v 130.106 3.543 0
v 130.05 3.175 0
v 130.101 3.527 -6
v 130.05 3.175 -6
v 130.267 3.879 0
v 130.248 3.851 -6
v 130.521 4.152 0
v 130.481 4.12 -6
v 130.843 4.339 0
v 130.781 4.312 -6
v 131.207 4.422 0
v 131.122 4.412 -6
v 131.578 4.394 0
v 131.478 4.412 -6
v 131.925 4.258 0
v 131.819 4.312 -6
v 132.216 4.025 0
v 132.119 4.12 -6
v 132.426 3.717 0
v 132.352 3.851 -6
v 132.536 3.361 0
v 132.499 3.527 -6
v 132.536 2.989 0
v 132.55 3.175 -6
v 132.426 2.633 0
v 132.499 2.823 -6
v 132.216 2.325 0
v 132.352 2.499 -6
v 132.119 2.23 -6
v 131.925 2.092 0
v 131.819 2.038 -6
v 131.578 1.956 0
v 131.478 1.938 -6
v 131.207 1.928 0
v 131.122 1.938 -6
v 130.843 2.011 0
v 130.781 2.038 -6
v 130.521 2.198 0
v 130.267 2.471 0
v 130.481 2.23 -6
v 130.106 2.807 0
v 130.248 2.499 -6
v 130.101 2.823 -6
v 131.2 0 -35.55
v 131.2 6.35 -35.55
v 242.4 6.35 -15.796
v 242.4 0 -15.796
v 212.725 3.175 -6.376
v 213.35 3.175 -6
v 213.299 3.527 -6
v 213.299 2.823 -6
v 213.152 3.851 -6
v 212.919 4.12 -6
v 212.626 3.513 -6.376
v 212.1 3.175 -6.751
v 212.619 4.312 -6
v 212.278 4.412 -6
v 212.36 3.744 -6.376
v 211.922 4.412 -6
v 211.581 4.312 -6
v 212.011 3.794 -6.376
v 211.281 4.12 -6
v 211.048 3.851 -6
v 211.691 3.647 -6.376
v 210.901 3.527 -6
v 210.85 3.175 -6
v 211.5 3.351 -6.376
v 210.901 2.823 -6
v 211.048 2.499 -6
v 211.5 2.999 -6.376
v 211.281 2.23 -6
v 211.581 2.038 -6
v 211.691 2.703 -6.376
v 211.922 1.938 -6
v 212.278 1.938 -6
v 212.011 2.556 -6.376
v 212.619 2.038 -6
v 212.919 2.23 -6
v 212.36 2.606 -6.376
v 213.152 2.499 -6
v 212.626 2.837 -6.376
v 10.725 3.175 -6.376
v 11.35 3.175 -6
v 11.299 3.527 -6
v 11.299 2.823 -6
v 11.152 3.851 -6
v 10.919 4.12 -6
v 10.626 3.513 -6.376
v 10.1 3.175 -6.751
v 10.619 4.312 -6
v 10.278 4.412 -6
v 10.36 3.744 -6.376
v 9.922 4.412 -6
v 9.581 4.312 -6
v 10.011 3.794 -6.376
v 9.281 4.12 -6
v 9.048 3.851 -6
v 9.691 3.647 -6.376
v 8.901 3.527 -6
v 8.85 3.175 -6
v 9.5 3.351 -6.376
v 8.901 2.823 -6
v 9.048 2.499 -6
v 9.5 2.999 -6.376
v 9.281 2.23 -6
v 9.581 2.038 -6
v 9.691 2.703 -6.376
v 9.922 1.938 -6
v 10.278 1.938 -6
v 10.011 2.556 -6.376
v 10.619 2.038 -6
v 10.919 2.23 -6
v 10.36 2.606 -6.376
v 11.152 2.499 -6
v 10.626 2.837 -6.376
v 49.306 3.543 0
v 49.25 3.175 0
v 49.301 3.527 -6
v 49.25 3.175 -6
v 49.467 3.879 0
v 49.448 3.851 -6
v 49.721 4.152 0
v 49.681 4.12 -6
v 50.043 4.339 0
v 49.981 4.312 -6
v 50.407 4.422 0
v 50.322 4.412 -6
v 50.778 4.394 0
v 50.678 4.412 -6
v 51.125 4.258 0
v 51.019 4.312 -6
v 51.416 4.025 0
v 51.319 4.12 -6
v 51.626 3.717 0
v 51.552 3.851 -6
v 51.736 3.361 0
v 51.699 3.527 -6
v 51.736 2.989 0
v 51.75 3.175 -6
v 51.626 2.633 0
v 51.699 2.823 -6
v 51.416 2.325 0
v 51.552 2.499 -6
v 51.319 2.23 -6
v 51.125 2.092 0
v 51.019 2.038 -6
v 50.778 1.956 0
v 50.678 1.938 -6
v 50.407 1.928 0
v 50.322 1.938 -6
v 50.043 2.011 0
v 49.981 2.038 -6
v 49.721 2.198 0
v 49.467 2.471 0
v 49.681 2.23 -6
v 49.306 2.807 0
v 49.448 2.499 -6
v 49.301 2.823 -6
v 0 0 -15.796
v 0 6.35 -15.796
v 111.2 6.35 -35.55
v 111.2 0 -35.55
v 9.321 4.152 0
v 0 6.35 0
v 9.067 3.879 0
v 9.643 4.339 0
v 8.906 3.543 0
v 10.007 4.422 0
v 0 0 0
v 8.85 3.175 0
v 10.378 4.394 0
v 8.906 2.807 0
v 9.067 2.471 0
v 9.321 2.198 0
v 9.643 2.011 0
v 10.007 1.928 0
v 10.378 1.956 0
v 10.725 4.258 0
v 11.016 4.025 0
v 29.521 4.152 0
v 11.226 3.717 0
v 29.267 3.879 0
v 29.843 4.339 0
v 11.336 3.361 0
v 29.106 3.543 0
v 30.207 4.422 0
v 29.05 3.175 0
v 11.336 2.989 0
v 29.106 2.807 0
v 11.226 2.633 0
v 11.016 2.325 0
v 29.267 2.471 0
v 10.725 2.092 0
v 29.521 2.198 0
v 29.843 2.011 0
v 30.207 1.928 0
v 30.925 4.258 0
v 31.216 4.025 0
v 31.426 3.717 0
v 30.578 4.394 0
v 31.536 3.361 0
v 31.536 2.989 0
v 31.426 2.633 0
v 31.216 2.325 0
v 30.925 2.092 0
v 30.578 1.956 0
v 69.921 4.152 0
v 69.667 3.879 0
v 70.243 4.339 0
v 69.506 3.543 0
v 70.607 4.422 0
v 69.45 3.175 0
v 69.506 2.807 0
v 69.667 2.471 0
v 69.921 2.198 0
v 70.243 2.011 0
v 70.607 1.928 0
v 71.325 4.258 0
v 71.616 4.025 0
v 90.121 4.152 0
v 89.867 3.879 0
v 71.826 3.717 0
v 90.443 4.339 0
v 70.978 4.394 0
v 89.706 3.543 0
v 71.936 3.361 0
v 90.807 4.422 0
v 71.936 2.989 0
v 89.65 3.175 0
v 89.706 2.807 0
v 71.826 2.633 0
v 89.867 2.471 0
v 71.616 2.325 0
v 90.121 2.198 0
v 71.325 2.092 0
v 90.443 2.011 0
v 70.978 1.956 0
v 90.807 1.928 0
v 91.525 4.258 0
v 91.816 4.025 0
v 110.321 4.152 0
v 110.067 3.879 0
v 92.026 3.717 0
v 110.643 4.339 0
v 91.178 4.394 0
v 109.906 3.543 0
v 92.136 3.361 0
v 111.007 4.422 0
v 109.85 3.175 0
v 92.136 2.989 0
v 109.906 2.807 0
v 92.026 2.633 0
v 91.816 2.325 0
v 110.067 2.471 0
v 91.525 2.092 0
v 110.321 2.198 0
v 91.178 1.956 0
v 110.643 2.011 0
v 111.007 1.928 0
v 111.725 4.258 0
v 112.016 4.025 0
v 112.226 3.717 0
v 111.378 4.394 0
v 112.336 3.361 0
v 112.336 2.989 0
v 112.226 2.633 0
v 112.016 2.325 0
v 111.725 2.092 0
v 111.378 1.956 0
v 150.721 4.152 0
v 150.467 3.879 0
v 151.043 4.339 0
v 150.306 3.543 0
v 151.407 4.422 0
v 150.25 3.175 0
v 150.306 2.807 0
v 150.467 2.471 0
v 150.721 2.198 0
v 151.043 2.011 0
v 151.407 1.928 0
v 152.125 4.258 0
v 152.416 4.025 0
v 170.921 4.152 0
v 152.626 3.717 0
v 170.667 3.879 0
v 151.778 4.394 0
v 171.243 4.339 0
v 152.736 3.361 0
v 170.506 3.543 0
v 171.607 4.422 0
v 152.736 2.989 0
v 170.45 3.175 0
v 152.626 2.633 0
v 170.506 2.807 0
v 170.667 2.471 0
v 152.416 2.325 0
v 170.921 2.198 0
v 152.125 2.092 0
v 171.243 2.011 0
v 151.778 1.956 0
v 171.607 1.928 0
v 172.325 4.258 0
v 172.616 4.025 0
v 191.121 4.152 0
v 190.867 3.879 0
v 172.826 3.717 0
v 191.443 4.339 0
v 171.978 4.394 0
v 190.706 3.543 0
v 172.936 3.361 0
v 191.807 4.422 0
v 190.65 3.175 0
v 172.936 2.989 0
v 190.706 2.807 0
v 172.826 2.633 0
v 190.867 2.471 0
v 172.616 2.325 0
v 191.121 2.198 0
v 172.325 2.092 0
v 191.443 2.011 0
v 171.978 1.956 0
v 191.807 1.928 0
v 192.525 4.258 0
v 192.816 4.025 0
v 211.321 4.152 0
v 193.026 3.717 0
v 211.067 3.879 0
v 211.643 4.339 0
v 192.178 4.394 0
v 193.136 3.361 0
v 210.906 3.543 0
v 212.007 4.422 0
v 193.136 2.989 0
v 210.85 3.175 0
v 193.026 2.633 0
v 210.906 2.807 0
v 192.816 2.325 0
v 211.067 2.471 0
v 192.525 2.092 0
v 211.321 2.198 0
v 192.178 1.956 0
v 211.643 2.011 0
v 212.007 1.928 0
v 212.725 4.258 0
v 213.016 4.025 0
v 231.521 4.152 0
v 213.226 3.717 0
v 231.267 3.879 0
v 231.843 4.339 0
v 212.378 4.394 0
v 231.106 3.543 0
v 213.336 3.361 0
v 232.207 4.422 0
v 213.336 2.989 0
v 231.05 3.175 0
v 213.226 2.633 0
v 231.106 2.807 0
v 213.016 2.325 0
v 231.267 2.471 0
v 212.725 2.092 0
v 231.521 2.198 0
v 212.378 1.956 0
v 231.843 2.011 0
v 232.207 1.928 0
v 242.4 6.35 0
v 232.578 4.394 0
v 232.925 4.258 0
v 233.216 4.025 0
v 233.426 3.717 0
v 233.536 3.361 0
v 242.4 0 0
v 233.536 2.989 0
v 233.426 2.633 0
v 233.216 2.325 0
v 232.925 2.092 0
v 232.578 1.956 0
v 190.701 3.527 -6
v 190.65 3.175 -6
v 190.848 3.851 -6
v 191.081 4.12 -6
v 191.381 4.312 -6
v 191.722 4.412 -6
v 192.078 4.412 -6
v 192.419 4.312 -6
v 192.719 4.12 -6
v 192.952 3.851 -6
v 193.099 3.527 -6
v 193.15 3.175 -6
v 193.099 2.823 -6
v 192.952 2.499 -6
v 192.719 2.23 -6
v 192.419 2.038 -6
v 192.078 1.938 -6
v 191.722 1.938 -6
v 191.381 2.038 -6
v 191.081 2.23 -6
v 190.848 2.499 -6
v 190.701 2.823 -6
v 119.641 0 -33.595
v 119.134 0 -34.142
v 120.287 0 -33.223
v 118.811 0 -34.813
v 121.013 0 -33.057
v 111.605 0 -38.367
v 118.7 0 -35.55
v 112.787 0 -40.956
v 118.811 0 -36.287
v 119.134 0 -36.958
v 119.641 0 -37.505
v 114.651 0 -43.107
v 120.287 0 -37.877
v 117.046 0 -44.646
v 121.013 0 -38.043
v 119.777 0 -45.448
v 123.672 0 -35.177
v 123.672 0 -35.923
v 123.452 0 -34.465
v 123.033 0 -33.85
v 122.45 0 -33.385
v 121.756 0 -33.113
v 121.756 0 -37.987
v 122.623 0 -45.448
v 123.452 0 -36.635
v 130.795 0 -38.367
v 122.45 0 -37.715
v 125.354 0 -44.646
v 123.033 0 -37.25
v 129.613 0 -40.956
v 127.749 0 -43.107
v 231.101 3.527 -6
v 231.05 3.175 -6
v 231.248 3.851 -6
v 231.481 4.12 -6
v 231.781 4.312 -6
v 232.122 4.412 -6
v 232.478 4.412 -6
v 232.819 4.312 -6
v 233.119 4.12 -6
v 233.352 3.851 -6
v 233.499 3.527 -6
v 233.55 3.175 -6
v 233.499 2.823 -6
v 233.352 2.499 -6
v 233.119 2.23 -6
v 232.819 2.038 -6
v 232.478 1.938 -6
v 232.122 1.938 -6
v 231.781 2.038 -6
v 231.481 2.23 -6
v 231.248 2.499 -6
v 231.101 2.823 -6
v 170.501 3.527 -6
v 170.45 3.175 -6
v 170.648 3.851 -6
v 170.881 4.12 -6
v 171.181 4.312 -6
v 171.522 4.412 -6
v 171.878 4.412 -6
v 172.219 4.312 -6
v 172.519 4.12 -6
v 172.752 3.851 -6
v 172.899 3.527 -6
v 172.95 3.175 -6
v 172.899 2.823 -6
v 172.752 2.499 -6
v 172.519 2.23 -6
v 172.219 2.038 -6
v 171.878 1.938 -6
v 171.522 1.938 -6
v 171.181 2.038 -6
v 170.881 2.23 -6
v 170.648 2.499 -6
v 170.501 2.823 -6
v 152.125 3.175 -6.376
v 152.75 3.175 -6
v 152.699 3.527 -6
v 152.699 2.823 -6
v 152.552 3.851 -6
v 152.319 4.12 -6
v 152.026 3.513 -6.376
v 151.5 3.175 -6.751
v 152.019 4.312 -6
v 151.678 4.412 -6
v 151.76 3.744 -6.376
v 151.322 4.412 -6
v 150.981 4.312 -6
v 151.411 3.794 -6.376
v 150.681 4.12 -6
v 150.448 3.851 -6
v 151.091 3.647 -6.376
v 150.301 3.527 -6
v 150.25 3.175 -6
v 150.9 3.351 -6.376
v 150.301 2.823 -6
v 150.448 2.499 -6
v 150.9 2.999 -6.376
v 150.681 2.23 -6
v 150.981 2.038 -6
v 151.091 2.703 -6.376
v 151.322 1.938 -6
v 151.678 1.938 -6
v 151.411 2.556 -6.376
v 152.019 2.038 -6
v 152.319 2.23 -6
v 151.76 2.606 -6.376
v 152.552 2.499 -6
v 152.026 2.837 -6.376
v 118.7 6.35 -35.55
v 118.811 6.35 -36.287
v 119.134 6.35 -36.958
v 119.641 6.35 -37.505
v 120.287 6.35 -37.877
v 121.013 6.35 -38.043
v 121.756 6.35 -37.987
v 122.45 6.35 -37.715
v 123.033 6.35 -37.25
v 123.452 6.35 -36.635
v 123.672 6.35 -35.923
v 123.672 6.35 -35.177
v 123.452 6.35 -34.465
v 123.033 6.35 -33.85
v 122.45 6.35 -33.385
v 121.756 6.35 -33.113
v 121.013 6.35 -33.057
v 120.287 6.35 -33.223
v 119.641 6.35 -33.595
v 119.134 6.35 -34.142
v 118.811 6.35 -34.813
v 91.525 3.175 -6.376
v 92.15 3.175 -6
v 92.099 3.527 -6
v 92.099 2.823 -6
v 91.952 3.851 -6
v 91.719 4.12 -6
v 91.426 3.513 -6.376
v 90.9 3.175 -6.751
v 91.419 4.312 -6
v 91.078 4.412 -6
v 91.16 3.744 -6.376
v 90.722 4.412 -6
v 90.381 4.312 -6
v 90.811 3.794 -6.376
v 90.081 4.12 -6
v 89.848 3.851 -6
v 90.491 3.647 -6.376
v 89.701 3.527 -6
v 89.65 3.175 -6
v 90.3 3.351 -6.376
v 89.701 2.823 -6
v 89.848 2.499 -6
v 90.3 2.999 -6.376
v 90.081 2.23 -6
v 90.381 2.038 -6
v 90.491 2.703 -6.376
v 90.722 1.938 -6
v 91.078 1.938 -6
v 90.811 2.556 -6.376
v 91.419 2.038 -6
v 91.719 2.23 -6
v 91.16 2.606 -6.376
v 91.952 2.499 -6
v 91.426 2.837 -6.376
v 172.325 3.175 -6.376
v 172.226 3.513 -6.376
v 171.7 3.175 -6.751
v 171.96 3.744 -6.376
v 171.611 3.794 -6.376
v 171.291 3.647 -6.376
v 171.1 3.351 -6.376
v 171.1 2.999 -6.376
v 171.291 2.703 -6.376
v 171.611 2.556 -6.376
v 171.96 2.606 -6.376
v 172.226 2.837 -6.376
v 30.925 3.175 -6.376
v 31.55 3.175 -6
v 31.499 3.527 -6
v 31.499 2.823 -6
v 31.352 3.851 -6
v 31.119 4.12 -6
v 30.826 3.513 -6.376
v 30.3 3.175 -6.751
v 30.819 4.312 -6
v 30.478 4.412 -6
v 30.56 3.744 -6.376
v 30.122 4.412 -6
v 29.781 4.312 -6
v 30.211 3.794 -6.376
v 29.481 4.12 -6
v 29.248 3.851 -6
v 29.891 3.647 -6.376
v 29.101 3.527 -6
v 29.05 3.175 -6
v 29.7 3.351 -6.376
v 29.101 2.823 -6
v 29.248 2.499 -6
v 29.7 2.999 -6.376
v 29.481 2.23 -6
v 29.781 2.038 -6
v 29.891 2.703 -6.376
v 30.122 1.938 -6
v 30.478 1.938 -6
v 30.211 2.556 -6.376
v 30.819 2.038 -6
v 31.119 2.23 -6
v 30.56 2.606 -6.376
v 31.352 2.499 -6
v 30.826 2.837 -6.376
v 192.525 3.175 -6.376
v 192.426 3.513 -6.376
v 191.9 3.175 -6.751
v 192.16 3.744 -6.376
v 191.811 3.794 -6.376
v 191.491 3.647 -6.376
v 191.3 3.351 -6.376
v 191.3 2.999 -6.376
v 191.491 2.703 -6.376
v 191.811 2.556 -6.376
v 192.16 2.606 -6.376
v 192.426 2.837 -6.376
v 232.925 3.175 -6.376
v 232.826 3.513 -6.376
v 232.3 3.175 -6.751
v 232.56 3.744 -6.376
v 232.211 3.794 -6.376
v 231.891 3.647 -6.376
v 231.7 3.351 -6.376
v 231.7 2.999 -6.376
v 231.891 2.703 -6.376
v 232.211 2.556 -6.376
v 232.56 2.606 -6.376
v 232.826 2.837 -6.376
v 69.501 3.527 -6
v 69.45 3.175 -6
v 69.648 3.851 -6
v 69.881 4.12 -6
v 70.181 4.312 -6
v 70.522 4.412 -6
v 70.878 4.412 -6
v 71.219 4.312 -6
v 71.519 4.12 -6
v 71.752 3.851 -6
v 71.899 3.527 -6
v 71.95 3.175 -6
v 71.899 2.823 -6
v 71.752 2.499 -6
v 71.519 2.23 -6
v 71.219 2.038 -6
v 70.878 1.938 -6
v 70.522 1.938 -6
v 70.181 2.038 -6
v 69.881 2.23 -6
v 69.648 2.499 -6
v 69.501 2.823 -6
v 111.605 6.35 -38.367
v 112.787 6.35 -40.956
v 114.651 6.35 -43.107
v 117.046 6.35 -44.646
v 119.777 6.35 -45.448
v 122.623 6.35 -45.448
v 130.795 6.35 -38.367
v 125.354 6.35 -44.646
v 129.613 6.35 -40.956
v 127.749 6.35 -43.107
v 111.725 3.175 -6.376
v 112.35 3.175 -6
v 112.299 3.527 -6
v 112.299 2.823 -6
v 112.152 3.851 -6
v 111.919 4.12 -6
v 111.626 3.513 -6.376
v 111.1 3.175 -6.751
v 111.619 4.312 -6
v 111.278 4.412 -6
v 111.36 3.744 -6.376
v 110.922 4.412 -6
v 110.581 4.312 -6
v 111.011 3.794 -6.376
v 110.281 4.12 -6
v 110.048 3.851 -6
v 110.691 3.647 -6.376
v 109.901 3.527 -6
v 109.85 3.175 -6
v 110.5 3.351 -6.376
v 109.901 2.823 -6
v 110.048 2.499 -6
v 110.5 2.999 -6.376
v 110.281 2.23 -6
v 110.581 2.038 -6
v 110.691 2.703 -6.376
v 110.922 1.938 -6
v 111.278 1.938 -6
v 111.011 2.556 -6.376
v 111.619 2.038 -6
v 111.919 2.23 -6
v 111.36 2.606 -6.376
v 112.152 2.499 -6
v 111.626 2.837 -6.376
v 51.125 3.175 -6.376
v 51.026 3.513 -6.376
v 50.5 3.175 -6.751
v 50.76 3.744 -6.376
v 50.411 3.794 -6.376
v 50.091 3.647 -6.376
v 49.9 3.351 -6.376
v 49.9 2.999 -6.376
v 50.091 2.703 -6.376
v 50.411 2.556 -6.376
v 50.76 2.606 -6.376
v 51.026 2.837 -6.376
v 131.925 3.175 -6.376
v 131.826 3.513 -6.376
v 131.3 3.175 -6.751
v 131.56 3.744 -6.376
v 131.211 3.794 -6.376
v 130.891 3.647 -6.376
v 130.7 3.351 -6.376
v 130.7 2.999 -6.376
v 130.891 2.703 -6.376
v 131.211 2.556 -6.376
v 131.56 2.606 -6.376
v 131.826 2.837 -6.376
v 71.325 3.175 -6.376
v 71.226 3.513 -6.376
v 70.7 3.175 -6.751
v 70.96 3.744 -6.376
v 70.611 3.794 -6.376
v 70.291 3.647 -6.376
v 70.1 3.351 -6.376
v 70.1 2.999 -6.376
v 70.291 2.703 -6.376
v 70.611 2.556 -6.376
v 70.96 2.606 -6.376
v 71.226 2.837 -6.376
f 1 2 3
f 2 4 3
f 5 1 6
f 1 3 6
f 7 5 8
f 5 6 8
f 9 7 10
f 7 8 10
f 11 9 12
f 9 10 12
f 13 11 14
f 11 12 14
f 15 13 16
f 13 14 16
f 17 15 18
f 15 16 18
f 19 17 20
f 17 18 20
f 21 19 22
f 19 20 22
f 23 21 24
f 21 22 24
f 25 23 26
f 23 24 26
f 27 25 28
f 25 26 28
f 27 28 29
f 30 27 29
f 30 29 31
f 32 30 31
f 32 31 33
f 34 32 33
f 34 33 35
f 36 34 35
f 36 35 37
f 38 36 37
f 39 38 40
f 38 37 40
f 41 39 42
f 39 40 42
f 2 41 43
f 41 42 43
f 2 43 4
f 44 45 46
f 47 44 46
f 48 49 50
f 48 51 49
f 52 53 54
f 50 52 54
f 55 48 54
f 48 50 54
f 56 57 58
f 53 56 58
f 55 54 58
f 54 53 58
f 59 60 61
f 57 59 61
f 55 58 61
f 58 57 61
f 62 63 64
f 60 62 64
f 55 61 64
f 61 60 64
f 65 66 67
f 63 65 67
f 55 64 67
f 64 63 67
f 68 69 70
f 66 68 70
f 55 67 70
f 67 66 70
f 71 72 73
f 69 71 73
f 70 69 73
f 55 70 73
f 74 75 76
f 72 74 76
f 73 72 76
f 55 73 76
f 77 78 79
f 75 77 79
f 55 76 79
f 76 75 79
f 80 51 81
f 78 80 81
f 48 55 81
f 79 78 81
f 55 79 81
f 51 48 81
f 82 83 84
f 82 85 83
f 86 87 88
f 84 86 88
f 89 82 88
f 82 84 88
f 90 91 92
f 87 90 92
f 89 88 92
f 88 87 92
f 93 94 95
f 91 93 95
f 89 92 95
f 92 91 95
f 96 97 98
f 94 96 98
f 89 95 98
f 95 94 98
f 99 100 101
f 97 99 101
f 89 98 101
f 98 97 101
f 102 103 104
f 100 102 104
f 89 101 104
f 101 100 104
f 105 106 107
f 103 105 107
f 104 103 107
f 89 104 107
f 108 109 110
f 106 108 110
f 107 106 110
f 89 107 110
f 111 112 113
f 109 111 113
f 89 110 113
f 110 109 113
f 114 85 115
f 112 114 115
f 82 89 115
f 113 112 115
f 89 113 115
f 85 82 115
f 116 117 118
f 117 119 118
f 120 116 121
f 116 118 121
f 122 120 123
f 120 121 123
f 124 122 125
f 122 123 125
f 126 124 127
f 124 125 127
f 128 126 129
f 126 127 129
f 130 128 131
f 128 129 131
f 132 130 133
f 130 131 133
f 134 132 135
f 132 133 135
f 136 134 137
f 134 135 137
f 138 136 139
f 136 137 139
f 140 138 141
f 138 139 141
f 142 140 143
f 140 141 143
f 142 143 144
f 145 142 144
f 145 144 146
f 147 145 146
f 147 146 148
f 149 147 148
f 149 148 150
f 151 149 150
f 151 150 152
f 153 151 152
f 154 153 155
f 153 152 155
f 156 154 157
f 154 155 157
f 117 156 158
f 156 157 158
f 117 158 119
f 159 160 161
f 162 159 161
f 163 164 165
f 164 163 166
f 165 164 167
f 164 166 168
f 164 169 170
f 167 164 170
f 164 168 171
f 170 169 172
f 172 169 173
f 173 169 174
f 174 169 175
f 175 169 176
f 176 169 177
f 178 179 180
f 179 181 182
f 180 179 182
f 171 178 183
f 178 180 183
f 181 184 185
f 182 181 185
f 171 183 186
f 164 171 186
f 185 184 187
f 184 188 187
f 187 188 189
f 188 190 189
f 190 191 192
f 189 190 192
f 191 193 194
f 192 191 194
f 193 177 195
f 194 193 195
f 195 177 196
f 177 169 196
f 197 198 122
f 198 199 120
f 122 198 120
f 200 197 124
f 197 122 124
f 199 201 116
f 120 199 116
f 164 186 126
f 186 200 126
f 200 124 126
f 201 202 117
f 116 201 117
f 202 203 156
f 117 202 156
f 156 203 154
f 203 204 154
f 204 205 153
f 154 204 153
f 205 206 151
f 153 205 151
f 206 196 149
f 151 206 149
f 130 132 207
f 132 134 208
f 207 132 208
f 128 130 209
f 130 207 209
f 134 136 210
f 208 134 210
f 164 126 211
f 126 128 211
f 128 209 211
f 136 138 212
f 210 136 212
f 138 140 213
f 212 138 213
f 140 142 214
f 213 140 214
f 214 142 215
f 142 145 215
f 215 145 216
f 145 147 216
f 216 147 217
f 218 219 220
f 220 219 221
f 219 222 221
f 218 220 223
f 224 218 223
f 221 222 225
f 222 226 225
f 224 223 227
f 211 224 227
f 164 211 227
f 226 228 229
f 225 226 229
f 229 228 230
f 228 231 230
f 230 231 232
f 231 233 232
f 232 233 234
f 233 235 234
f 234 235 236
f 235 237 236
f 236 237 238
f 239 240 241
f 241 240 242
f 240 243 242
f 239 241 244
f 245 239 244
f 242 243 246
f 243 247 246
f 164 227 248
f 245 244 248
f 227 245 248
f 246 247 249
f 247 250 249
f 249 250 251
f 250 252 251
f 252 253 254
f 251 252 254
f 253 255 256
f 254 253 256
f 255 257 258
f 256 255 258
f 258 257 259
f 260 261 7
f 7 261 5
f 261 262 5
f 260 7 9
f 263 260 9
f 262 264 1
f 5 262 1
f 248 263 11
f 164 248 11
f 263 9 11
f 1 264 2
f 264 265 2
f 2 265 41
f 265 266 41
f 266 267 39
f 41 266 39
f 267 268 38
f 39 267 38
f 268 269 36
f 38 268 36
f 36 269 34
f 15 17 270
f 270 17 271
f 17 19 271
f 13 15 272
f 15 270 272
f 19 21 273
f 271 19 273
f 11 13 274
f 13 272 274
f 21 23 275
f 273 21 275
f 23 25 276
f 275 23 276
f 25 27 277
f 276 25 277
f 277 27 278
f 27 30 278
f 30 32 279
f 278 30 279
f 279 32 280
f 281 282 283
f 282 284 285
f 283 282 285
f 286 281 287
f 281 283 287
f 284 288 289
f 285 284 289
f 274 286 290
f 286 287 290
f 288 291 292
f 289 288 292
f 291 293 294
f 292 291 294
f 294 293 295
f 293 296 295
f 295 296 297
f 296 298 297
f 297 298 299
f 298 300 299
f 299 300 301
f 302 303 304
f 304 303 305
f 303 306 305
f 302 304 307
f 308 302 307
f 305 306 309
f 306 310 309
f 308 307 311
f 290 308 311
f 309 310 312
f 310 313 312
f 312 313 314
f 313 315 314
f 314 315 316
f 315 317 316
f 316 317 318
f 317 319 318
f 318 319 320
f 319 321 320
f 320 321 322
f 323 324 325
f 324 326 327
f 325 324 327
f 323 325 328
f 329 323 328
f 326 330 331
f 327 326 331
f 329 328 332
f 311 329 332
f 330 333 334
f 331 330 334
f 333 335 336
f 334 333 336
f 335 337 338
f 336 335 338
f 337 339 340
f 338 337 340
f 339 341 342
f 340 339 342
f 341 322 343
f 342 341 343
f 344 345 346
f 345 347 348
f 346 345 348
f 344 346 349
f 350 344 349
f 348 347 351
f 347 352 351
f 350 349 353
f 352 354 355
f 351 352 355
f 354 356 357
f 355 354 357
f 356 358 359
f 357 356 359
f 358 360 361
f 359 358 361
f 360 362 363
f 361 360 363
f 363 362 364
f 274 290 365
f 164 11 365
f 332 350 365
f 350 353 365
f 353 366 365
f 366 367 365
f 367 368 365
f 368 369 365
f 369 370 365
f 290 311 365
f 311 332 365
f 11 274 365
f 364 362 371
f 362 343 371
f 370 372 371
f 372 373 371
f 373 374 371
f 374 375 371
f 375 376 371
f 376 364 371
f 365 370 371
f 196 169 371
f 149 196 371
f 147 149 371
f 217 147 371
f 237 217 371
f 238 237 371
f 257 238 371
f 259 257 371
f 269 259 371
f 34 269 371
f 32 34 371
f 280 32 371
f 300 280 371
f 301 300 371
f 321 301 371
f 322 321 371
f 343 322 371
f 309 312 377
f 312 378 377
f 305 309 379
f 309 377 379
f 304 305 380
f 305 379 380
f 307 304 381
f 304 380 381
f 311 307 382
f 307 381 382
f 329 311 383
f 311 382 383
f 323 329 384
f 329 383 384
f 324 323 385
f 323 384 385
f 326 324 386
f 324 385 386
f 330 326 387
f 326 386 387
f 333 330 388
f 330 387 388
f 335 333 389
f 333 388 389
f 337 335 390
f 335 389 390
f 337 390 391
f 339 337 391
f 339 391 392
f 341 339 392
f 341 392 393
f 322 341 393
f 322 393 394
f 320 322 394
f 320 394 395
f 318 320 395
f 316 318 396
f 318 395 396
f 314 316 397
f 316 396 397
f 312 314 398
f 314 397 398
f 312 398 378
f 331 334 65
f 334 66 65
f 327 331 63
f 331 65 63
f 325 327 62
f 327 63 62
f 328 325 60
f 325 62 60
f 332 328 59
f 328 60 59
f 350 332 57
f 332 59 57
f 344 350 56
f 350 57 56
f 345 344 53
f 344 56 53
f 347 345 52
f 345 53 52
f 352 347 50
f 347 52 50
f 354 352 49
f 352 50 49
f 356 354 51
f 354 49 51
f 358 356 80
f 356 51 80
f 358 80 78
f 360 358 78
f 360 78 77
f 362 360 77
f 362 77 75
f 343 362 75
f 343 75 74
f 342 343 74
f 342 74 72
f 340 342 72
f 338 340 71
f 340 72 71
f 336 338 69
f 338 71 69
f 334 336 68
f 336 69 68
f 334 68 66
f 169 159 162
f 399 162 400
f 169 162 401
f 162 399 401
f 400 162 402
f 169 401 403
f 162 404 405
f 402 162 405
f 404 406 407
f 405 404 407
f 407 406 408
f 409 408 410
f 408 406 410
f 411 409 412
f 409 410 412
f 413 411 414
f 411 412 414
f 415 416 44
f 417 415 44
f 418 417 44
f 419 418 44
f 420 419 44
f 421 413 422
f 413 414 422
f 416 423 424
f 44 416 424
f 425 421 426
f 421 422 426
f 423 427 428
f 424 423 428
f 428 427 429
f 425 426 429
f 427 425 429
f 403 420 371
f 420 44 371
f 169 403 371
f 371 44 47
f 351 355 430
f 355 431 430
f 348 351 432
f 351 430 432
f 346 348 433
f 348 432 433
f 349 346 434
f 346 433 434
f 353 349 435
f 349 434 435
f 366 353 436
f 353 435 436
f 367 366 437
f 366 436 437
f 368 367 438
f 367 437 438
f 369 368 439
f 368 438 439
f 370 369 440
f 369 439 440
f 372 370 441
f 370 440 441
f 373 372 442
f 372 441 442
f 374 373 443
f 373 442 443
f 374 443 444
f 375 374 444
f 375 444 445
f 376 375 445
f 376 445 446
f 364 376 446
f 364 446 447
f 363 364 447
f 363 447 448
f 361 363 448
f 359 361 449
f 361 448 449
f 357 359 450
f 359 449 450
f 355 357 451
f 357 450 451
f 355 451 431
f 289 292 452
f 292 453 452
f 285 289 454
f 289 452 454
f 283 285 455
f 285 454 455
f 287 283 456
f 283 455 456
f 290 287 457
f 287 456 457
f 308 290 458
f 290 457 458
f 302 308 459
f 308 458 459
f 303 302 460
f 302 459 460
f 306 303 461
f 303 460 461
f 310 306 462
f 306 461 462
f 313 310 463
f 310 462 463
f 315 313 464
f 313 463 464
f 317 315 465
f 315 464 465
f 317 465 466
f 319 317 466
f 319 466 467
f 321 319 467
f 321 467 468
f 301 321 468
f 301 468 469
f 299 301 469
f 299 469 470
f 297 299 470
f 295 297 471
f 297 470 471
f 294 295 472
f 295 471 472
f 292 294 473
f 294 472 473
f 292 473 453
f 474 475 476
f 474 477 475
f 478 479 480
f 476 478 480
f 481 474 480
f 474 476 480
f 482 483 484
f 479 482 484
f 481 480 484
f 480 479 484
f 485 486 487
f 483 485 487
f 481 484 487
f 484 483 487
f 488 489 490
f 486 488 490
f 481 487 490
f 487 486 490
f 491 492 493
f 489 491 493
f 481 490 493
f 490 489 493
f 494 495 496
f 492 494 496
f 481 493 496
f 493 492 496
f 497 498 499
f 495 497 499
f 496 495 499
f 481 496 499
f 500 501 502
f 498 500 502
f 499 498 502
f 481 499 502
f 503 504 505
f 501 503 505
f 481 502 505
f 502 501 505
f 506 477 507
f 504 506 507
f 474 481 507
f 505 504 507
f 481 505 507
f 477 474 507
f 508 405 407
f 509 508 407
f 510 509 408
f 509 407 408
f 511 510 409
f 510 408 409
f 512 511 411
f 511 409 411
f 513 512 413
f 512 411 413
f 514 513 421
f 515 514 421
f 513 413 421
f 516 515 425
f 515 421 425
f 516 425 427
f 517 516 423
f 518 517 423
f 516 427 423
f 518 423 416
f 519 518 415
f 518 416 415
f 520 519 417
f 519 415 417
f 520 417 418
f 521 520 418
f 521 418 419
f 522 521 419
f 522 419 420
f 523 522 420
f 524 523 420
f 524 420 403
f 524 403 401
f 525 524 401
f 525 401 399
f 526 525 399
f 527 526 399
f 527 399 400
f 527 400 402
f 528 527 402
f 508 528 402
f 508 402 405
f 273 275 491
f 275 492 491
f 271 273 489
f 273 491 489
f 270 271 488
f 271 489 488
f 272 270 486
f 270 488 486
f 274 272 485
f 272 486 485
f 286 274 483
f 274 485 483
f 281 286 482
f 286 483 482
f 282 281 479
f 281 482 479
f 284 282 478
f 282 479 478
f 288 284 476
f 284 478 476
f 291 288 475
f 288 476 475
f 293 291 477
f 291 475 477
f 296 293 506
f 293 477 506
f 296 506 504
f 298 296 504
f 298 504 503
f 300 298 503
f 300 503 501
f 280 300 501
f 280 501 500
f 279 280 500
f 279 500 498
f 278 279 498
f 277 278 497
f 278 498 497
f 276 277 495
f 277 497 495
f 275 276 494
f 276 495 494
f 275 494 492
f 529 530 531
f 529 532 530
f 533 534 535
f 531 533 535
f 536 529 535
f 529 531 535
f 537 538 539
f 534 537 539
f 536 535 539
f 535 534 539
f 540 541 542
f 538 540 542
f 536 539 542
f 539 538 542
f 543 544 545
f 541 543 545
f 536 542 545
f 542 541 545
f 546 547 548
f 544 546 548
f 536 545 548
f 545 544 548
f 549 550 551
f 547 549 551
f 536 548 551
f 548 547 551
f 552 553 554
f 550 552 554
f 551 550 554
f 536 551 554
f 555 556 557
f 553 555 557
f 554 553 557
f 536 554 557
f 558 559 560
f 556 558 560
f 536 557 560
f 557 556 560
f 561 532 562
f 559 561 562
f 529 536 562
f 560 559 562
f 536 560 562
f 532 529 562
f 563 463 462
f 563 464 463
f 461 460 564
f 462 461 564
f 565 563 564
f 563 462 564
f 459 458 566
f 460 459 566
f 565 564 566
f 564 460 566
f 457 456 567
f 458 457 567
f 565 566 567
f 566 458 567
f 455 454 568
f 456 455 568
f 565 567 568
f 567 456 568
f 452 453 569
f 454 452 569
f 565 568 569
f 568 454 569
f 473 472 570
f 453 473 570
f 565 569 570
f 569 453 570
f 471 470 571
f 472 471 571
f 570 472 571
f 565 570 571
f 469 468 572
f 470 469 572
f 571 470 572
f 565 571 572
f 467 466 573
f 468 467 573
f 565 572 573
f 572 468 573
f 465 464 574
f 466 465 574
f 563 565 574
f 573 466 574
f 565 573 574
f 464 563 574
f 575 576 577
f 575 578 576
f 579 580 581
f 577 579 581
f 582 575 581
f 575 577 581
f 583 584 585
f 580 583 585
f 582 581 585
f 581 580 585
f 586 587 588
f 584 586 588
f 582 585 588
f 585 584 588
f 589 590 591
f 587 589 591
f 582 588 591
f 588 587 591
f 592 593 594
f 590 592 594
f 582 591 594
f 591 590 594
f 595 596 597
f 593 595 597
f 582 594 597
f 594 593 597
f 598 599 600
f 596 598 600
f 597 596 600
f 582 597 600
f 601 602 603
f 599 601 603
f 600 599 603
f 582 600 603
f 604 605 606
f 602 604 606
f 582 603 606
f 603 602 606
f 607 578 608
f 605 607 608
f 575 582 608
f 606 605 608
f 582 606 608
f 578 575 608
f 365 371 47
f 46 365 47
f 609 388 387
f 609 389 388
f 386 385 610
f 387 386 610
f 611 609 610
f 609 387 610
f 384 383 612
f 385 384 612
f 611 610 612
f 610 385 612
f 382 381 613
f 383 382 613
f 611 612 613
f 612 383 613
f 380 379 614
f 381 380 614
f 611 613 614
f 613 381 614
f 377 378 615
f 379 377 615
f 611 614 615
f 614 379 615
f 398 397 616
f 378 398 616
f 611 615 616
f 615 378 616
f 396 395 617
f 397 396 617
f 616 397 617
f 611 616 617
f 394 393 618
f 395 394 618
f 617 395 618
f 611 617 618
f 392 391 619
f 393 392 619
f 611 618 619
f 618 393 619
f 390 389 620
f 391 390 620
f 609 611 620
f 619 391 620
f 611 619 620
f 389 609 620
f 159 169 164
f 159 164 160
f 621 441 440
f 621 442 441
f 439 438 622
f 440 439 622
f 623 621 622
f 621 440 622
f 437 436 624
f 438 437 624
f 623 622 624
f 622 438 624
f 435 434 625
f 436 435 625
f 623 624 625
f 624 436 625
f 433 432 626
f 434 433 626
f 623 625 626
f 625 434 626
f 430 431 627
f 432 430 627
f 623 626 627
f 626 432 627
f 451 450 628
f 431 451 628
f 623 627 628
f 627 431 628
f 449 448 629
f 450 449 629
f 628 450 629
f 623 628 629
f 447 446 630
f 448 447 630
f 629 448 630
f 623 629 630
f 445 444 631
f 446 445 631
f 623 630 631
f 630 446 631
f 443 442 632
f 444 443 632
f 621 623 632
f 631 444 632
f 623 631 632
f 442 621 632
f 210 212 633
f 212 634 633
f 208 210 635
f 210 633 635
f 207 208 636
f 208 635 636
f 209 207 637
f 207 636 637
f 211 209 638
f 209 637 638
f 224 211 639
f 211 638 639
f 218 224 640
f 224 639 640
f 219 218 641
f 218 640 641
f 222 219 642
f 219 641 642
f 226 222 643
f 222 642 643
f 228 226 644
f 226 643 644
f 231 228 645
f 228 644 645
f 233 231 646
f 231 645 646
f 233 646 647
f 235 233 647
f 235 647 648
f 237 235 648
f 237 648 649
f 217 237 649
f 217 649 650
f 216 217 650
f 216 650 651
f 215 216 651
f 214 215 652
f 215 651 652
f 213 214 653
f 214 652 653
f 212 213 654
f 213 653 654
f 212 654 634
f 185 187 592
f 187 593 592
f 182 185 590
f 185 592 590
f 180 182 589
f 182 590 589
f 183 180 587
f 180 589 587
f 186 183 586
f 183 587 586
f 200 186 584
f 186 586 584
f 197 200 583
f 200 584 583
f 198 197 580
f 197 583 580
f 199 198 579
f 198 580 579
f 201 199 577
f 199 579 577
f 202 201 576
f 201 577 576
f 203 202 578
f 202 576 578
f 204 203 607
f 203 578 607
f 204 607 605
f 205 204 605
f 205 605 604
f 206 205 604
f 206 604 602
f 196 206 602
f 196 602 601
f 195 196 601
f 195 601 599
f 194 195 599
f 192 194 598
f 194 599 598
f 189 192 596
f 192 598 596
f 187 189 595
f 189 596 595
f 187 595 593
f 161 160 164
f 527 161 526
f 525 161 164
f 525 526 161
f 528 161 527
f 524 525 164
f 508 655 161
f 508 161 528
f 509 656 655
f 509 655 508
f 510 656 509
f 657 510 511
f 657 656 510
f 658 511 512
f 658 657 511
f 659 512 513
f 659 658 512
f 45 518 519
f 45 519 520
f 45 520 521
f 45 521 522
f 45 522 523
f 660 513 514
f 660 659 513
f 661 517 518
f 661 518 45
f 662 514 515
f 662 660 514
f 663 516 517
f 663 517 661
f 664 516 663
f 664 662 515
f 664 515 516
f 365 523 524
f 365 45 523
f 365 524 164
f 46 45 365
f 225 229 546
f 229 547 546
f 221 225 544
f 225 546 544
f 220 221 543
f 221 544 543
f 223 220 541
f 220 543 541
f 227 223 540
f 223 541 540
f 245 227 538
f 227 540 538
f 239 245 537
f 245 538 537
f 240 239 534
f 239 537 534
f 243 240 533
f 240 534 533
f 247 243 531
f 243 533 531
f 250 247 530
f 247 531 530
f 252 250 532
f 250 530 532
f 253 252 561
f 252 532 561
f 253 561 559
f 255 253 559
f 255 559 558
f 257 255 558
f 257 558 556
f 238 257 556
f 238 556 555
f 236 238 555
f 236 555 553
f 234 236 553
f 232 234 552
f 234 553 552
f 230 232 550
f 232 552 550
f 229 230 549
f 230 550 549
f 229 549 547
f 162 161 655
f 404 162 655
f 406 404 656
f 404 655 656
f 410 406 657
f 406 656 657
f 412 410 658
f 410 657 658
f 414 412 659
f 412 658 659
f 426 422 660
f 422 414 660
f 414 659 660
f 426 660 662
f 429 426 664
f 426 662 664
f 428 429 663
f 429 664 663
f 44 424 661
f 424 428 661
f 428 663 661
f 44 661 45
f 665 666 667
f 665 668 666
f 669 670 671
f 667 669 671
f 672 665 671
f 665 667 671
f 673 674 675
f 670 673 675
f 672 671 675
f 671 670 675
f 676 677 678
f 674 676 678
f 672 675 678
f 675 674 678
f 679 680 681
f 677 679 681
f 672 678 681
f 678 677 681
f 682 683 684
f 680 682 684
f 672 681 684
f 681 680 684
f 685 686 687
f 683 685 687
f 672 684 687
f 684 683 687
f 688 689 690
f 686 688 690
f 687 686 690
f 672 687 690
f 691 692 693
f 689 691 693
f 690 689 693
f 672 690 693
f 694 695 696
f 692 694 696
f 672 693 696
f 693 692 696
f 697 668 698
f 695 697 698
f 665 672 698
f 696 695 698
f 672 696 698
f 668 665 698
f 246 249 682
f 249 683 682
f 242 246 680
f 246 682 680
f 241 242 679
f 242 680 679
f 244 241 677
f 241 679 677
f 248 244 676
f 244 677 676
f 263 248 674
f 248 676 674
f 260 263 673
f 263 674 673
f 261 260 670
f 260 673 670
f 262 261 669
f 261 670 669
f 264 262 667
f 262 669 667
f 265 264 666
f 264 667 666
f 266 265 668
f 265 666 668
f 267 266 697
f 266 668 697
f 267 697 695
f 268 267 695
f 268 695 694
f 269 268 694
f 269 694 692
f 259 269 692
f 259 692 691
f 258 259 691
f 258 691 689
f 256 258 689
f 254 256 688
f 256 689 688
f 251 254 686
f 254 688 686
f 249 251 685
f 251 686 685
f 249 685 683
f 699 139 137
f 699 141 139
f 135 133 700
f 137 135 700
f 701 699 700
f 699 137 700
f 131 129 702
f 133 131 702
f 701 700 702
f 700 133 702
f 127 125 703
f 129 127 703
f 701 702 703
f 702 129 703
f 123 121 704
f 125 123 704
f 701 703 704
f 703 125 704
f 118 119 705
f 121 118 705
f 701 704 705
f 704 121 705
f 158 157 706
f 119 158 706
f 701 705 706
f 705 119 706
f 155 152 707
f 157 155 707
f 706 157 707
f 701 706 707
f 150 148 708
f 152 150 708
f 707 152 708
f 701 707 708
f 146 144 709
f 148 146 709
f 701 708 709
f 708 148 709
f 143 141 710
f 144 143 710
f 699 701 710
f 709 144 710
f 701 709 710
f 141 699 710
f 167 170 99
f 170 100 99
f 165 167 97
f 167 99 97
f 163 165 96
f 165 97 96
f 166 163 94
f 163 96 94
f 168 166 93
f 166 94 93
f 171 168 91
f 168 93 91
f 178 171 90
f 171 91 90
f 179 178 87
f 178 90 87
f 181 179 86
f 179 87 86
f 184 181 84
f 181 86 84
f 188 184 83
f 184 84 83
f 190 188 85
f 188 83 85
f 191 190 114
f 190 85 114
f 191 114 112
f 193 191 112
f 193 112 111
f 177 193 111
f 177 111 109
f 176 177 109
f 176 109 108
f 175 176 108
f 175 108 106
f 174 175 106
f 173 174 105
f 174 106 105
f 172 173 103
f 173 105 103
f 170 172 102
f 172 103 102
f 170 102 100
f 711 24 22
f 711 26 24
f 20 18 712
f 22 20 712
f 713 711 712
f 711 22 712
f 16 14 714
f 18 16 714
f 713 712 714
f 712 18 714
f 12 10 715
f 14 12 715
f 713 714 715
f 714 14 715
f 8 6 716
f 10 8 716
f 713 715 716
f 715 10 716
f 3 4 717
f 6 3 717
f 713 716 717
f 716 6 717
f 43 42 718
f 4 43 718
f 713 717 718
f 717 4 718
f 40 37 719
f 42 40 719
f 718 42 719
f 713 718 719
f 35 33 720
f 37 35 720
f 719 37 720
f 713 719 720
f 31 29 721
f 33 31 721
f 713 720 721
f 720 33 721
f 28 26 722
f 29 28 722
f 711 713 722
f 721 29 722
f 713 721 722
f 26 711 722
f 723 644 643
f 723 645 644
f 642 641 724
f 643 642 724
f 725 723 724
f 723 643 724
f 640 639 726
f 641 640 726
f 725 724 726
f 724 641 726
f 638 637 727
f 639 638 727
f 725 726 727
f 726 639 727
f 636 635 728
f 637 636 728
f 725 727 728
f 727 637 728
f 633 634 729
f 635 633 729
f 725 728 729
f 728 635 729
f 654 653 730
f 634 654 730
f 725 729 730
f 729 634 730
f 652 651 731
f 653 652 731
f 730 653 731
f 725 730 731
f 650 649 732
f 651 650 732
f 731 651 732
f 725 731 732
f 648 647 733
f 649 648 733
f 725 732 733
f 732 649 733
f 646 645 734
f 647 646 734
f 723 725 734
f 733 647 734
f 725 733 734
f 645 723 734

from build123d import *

# Parameters (mm, degrees)
SKETCH1_W                       = 242.4
SKETCH1_H                       = 71.1
BOSS_EXTRUDE1_DEPTH             = 6.35
SKETCH2_OUTSIDE_W               = 294.938
SKETCH2_OUTSIDE_H               = 123.638
CUT_EXTRUDE1_DEPTH              = 10
TAP_DRILL_FOR_M3X0_5_TAP1_D     = 2.5
TAP_DRILL_FOR_M3X0_5_TAP1_DEPTH = 6
TAP_DRILL_FOR_M3X0_5_TAP1_TIP   = 0.751075774
TAP_DRILL_FOR_M6X1_0_TAP1_D     = 5


with BuildPart() as part:
    # Sketch1 → Boss-Extrude1 (new body)
    with BuildSketch(Plane(origin=(0, 0, 0), x_dir=(1, 0, 0), z_dir=(0, 1, 0))):
        with Locations((121.2, 35.55)):
            Rectangle(SKETCH1_W, SKETCH1_H)
    extrude(amount=BOSS_EXTRUDE1_DEPTH)

    # Sketch2 outside → Cut-Extrude1 (cut)
    with BuildSketch(Plane(origin=(0, 6.35, 0), x_dir=(1, 0, 0), z_dir=(0, 1, 0))):
        with Locations((121.2, 35.55)):
            Rectangle(SKETCH2_OUTSIDE_W, SKETCH2_OUTSIDE_H)
        with BuildLine():
            Line((0, 0), (0, 15.796122239))
            Line((0, 15.796122239), (111.2, 35.55))
            ThreePointArc((111.2, 35.55), (121.2, 45.55), (131.2, 35.55))
            Line((131.2, 35.55), (242.4, 15.796122239))
            Line((242.4, 15.796122239), (242.4, 0))
            Line((242.4, 0), (0, 0))
        make_face(mode=Mode.SUBTRACT)
    extrude(amount=-CUT_EXTRUDE1_DEPTH, mode=Mode.SUBTRACT)

    # Tap Drill for M3x0.5 Tap1
    with Locations(Plane.XY):
        with Locations((232.3, 3.175), (10.1, 3.175), (30.3, 3.175), (50.5, 3.175), (70.7, 3.175), (90.9, 3.175), (111.1, 3.175), (131.3, 3.175), (151.5, 3.175), (171.7, 3.175), (191.9, 3.175), (212.1, 3.175)):
            Hole(TAP_DRILL_FOR_M3X0_5_TAP1_D / 2, depth=TAP_DRILL_FOR_M3X0_5_TAP1_DEPTH)
            with Locations((0, 0, -(TAP_DRILL_FOR_M3X0_5_TAP1_DEPTH + TAP_DRILL_FOR_M3X0_5_TAP1_TIP / 2))):  # 118° drill point
                Cone(0, TAP_DRILL_FOR_M3X0_5_TAP1_D / 2, TAP_DRILL_FOR_M3X0_5_TAP1_TIP, mode=Mode.SUBTRACT)

    # Tap Drill for M6x1.0 Tap1 (through all)
    with Locations(Plane(origin=(0, 6.35, 0), x_dir=(1, 0, 0), z_dir=(0, 1, 0))):
        with Locations((121.2, 35.55)):
            Hole(TAP_DRILL_FOR_M6X1_0_TAP1_D / 2)


solid = part.part
